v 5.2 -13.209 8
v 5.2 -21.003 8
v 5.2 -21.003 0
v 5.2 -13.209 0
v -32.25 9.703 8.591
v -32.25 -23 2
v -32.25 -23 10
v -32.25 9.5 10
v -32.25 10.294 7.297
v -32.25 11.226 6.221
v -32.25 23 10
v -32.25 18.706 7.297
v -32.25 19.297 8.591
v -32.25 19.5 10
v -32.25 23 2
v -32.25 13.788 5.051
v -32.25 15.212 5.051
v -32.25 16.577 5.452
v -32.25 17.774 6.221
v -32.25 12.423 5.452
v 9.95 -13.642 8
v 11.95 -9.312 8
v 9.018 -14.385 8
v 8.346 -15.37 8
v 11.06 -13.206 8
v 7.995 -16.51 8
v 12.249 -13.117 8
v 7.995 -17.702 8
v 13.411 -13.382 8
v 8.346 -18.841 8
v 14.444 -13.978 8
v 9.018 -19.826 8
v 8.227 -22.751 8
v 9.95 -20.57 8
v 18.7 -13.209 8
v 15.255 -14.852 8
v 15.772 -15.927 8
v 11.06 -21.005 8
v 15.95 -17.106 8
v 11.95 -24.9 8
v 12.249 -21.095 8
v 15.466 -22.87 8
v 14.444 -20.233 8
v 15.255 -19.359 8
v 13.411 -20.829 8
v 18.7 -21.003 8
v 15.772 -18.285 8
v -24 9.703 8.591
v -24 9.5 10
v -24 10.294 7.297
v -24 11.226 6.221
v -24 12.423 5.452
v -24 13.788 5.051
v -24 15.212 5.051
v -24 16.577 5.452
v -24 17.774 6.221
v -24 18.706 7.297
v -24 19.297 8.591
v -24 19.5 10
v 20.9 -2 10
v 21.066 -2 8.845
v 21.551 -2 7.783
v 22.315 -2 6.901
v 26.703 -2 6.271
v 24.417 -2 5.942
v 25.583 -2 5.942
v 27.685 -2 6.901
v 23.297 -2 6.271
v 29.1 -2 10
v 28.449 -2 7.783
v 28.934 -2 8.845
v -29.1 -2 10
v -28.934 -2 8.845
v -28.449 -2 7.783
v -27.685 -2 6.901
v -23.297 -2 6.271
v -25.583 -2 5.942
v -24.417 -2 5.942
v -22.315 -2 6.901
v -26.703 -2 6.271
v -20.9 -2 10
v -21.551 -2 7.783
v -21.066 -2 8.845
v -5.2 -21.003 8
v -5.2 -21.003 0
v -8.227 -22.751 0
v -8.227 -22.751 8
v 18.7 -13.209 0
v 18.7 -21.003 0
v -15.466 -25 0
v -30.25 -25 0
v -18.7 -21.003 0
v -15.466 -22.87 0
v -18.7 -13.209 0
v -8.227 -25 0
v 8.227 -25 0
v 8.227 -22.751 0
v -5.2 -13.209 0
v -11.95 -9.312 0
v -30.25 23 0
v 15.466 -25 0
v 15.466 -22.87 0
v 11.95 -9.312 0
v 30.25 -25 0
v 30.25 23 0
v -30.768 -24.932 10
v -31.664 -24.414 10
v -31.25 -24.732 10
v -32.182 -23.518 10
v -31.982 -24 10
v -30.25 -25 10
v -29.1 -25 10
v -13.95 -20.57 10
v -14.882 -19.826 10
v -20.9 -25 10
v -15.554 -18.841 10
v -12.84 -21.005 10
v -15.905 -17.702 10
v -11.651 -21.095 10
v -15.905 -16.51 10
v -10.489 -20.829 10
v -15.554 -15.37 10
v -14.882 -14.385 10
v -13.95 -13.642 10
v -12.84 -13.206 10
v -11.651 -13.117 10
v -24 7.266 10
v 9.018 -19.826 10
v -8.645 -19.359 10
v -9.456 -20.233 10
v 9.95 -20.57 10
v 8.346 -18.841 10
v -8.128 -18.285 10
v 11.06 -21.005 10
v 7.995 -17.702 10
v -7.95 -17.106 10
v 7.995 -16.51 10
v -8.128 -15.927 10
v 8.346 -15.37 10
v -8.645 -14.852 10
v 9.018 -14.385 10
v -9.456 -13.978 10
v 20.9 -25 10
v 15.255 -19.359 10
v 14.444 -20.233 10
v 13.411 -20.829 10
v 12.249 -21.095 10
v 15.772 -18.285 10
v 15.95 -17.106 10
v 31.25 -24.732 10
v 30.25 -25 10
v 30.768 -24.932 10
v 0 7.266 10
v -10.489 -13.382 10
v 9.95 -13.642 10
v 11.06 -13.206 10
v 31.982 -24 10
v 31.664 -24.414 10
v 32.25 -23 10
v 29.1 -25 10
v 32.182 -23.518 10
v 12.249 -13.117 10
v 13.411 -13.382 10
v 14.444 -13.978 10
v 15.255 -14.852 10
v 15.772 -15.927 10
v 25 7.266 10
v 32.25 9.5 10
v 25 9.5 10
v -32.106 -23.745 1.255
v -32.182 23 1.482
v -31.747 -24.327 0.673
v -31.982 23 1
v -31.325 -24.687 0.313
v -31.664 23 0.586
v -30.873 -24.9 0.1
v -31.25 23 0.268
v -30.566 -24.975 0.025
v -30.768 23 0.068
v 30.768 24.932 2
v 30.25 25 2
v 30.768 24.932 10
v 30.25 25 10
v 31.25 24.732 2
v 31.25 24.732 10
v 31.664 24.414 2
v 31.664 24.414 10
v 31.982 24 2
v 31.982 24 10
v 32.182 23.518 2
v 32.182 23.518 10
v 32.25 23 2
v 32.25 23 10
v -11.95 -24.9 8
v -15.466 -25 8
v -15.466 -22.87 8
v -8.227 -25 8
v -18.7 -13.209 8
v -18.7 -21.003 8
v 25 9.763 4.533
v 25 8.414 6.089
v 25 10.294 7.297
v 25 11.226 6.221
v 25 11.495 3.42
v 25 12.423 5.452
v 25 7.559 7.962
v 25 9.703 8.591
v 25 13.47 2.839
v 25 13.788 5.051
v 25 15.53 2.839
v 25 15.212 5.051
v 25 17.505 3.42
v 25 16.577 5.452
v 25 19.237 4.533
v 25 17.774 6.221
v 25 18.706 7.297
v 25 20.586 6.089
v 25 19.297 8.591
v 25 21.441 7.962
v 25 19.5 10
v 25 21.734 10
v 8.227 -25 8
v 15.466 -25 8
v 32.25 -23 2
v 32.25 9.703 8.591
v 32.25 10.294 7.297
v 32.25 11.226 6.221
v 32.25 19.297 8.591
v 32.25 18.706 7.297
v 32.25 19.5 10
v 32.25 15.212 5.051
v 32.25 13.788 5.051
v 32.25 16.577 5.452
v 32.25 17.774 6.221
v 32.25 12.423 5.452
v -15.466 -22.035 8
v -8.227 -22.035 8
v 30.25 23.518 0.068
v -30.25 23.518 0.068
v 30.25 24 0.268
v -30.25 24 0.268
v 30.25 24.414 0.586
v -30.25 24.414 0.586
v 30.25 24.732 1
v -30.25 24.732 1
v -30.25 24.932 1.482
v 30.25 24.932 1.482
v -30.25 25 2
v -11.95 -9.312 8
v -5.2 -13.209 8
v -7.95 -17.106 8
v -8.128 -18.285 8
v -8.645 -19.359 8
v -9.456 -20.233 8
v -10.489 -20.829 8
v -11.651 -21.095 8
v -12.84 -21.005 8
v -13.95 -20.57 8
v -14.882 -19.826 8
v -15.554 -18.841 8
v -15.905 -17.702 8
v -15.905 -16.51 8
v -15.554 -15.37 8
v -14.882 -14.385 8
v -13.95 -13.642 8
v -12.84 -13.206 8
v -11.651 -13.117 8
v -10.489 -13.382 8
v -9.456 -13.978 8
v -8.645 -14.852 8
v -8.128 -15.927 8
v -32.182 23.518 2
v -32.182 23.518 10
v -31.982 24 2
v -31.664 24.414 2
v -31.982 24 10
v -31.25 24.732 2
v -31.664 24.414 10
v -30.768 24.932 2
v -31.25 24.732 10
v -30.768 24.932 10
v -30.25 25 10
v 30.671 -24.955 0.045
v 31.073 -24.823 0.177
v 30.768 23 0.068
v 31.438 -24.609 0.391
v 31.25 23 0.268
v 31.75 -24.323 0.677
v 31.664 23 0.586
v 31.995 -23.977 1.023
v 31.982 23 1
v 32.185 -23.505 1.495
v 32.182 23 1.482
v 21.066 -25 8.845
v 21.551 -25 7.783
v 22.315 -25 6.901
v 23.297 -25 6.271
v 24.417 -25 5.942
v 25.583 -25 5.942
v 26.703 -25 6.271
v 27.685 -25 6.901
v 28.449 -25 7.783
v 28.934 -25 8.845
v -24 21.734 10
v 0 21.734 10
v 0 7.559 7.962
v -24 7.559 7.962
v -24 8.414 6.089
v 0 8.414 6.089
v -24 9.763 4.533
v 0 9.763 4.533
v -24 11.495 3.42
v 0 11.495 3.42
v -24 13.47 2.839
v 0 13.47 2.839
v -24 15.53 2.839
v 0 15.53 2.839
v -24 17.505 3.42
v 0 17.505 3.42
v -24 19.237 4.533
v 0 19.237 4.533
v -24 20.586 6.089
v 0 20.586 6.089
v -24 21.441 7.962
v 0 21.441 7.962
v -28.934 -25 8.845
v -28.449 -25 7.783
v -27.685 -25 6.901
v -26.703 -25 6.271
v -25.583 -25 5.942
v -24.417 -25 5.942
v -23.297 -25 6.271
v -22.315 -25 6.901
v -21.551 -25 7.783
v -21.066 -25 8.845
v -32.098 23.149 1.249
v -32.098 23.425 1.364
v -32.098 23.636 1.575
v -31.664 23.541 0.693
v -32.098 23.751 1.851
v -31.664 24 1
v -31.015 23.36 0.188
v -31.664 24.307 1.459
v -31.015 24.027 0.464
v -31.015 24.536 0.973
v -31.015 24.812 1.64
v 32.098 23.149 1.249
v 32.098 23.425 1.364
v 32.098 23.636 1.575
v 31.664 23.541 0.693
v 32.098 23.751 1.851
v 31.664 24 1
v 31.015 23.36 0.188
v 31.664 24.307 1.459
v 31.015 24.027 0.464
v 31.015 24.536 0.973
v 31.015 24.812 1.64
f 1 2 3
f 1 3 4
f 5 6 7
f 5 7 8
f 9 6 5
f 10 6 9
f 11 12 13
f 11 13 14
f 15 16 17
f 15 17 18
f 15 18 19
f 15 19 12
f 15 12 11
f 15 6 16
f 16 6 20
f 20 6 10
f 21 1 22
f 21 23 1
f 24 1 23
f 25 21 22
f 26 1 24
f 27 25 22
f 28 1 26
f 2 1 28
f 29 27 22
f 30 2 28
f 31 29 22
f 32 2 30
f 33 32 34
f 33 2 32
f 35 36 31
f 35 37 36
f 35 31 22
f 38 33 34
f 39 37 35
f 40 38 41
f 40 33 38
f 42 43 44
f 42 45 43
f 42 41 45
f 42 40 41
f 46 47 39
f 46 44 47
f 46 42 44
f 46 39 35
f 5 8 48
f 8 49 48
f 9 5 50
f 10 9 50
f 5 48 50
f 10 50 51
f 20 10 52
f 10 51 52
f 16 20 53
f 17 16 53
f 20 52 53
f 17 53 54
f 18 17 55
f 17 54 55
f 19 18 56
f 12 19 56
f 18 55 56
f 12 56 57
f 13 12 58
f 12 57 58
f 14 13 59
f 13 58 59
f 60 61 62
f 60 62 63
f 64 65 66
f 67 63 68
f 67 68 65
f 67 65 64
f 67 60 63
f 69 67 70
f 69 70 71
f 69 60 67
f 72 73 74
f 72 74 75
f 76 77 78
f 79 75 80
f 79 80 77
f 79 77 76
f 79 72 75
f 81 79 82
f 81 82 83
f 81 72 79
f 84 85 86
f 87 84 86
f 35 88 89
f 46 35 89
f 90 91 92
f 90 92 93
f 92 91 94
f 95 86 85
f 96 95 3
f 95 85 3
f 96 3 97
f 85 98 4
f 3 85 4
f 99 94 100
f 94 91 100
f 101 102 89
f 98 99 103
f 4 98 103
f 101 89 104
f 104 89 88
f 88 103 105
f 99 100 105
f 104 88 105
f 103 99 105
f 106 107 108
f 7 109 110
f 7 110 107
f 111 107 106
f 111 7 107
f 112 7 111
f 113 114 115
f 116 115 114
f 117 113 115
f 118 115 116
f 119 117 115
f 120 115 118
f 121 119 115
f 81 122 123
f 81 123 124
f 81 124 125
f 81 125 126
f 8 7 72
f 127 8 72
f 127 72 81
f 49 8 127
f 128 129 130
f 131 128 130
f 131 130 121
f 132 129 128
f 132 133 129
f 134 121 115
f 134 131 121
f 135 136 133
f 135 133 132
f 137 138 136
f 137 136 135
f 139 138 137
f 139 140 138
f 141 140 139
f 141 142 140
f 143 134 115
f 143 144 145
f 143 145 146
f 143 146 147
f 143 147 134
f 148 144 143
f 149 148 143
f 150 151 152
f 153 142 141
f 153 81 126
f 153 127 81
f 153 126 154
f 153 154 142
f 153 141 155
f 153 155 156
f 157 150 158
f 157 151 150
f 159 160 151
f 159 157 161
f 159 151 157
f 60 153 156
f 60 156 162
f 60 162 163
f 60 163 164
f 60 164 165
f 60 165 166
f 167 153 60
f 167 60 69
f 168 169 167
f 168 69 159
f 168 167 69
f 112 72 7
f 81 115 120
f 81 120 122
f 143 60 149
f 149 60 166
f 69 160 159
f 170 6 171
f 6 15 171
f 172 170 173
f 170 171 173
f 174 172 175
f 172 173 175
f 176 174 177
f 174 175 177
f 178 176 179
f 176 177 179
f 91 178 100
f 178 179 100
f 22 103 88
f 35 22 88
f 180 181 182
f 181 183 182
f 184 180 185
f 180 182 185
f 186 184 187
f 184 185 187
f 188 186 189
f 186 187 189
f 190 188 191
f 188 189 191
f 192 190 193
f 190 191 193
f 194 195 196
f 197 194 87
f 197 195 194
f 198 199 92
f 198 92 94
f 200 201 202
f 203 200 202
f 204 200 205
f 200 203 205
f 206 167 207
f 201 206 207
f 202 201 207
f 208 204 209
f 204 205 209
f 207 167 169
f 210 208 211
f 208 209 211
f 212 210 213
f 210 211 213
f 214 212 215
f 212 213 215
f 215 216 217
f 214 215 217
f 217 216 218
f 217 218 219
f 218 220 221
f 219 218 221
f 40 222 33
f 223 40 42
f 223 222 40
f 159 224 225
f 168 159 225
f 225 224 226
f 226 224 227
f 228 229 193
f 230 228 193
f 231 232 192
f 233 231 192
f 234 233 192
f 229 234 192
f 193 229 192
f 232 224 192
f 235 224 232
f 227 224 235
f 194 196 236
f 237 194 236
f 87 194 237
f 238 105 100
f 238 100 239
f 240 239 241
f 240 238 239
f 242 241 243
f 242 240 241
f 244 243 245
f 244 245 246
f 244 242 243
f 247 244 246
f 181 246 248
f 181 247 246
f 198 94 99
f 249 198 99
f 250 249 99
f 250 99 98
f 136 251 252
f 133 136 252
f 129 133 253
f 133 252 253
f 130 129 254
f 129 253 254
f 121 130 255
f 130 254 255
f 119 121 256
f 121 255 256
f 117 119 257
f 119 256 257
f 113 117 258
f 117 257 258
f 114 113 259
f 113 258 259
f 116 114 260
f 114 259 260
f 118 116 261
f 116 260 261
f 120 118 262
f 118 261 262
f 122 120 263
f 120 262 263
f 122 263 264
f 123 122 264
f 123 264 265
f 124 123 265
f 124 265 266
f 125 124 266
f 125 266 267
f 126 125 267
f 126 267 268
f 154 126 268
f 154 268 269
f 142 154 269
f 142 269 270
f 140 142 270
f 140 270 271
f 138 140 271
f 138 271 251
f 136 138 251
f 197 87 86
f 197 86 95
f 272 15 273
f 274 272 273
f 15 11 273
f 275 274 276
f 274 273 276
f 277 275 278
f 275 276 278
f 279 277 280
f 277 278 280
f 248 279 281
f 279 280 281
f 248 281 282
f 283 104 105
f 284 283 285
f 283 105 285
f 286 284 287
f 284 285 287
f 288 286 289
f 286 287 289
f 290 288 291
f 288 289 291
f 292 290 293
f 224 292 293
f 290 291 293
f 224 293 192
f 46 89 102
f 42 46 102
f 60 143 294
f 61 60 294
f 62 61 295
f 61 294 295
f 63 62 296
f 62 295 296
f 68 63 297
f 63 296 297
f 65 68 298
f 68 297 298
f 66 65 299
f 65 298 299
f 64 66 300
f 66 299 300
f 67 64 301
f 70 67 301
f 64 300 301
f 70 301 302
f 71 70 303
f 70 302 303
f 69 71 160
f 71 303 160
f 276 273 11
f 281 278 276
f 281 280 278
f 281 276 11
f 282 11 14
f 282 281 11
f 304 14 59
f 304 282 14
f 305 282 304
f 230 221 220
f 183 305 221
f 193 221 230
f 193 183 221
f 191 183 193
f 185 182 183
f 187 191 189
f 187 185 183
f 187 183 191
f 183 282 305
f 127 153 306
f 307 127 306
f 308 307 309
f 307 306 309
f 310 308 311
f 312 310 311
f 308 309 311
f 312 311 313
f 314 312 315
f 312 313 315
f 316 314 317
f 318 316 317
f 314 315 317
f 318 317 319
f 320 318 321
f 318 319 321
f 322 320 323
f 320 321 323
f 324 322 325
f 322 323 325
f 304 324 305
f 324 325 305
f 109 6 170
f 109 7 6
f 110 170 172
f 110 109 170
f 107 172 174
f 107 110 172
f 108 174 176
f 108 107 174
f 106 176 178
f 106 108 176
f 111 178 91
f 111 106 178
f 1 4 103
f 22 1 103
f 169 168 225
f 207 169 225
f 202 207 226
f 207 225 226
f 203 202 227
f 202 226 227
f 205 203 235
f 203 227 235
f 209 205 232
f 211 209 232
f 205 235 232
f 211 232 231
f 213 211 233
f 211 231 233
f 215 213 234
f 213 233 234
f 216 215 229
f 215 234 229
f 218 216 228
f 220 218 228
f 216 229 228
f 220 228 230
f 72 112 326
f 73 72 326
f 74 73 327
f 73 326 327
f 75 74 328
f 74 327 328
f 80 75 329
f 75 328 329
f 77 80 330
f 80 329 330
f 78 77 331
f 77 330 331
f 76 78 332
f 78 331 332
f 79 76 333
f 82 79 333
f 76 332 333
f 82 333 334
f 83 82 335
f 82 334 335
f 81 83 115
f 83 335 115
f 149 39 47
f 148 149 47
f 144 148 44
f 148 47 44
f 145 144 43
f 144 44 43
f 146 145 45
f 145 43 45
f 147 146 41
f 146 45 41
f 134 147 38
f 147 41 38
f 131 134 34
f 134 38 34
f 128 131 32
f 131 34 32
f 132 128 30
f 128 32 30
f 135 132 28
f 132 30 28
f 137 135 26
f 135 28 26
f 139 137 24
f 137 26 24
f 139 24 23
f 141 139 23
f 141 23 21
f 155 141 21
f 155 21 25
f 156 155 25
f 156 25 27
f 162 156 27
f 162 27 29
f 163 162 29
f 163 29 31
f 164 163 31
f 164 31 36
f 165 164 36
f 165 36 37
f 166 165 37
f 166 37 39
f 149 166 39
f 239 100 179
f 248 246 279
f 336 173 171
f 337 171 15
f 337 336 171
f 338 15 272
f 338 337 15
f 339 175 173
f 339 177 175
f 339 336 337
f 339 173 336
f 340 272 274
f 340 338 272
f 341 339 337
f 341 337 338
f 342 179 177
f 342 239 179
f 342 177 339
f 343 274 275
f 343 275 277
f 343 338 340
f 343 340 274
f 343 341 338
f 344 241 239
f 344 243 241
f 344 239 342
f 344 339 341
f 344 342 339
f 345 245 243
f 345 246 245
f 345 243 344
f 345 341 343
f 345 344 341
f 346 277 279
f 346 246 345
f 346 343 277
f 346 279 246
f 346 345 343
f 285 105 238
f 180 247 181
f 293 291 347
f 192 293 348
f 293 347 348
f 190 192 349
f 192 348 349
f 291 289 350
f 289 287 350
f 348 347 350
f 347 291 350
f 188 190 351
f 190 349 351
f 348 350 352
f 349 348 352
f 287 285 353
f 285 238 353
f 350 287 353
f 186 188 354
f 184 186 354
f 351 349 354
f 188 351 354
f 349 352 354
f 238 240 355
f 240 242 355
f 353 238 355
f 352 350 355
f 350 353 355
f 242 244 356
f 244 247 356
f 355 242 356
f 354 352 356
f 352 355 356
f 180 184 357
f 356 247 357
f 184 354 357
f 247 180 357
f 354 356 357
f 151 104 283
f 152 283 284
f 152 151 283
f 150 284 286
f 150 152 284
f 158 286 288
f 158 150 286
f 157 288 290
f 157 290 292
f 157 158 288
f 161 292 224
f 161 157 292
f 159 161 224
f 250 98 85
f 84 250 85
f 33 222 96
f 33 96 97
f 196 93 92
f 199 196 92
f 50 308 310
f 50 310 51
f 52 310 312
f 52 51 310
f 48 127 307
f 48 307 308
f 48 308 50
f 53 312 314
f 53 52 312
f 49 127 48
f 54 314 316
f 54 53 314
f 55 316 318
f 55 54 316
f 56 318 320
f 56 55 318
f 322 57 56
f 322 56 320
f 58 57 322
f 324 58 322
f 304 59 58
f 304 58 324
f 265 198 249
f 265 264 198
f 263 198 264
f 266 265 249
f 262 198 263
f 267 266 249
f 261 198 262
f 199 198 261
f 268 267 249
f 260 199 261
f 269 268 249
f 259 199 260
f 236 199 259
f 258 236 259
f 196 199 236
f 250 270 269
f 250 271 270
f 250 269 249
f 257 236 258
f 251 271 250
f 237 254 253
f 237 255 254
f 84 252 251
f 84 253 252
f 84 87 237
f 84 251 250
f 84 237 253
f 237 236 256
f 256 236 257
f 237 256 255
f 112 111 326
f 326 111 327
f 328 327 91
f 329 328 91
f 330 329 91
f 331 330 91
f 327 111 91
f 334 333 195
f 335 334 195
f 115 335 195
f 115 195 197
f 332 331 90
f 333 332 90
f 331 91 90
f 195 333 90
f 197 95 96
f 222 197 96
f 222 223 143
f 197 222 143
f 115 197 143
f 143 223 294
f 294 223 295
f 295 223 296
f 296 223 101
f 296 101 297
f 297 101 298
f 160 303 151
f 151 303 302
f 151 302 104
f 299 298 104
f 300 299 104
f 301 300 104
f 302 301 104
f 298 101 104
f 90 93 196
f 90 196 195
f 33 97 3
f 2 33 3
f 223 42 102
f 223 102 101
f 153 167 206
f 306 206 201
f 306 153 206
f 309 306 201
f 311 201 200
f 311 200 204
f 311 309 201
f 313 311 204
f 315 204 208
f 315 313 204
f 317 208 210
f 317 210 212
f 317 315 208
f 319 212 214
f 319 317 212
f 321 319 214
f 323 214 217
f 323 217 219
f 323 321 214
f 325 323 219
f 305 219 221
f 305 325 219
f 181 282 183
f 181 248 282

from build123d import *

# Parameters (mm, degrees)
F0_W           = 64.5
F0_H           = 50
F1_DEPTH       = 10
F3_DEPTH       = 8
F4_R           = 4
F5_DEPTH       = 25
F6_R           = 4.1
F7_DEPTH       = 23
F8_R           = 5
F9_DEPTH       = 64.501
F10_R          = 7.234183596
F11_DEPTH      = 24
F11_DEPTH_BACK = 25
F12_R          = 2
F13_W          = 7.2386283427
F13_H          = 5.7293735445
F14_DEPTH      = 25


with BuildPart() as f1:
    # F0 (on Top) → F1 (new body)
    with BuildSketch(Plane.XY):
        Rectangle(F0_W, F0_H)
    extrude(amount=F1_DEPTH)

    # F2 (on face) → F3 (cut)
    with BuildSketch(Plane(origin=(0, 0, 0), x_dir=(1, 0, 0), z_dir=(0, 0, -1))):
        Polygon((-5.2, 13.2086570489), (-5.2, 21.002885683), (-11.95, 24.9), (-18.7, 21.002885683), (-18.7, 13.2086570489), (-11.95, 9.3115427319), align=None)
        Polygon((18.7, 21.002885683), (11.95, 24.9), (5.2, 21.002885683), (5.2, 13.2086570489), (11.95, 9.3115427319), (18.7, 13.2086570489), align=None)
    extrude(amount=-F3_DEPTH, mode=Mode.SUBTRACT)

    # F4 (on face) → F5 (cut)
    with BuildSketch(Plane(origin=(0, 0, 8), x_dir=(1, 0, 0), z_dir=(0, 0, -1))):
        with Locations((-11.95, 17.1057713659)):
            Circle(F4_R)
        with Locations((11.95, 17.1057713659)):
            Circle(F4_R)
    extrude(amount=-F5_DEPTH, mode=Mode.SUBTRACT)

    # F6 (on face) → F7 (cut)
    with BuildSketch(Plane.XZ.offset(25)):
        with Locations((25, 10)):
            Circle(F6_R)
        with Locations((-25, 10)):
            Circle(F6_R)
    extrude(amount=-F7_DEPTH, mode=Mode.SUBTRACT)

    # F8 (on face) → F9 (cut, through all)
    with BuildSketch(Plane.YZ.offset(32.25)):
        with Locations((14.5, 10)):
            Circle(F8_R)
    extrude(amount=-F9_DEPTH, mode=Mode.SUBTRACT)

    # F10 (on Right) → F11 (cut, two sides)
    with BuildSketch(Plane.YZ) as f11_sk:
        with Locations((14.5, 10)):
            Circle(F10_R)
    extrude(amount=-F11_DEPTH, mode=Mode.SUBTRACT)
    extrude(f11_sk.sketch, amount=F11_DEPTH_BACK, mode=Mode.SUBTRACT)

    # F12
    f12_edges = [f1.edges().sort_by_distance(p)[0] for p in [
        (0, 25, 0),
        (32.25, 0, 0),
        (-32.25, 0, 0),
        (32.25, 25, 5),
        (-32.25, 25, 5),
        (-32.25, -25, 5),
        (32.25, -25, 5),
    ]]
    fillet(f12_edges, radius=F12_R)

    # F13 (on face) → F14 (cut)
    with BuildSketch(Plane(origin=(0, 0, 8), x_dir=(1, 0, 0), z_dir=(0, 0, -1))):
        with Locations((-11.8464780971, 24.8996280134)):
            Rectangle(F13_W, F13_H)
        Polygon((15.4657922685, 27.7643147856), (8.2271639258, 27.7643147856), (8.2271639258, 22.7506195904), (11.95, 24.9), (15.4657922685, 22.8701563874), align=None)
    extrude(amount=F14_DEPTH, mode=Mode.SUBTRACT)


solid = f1.part
